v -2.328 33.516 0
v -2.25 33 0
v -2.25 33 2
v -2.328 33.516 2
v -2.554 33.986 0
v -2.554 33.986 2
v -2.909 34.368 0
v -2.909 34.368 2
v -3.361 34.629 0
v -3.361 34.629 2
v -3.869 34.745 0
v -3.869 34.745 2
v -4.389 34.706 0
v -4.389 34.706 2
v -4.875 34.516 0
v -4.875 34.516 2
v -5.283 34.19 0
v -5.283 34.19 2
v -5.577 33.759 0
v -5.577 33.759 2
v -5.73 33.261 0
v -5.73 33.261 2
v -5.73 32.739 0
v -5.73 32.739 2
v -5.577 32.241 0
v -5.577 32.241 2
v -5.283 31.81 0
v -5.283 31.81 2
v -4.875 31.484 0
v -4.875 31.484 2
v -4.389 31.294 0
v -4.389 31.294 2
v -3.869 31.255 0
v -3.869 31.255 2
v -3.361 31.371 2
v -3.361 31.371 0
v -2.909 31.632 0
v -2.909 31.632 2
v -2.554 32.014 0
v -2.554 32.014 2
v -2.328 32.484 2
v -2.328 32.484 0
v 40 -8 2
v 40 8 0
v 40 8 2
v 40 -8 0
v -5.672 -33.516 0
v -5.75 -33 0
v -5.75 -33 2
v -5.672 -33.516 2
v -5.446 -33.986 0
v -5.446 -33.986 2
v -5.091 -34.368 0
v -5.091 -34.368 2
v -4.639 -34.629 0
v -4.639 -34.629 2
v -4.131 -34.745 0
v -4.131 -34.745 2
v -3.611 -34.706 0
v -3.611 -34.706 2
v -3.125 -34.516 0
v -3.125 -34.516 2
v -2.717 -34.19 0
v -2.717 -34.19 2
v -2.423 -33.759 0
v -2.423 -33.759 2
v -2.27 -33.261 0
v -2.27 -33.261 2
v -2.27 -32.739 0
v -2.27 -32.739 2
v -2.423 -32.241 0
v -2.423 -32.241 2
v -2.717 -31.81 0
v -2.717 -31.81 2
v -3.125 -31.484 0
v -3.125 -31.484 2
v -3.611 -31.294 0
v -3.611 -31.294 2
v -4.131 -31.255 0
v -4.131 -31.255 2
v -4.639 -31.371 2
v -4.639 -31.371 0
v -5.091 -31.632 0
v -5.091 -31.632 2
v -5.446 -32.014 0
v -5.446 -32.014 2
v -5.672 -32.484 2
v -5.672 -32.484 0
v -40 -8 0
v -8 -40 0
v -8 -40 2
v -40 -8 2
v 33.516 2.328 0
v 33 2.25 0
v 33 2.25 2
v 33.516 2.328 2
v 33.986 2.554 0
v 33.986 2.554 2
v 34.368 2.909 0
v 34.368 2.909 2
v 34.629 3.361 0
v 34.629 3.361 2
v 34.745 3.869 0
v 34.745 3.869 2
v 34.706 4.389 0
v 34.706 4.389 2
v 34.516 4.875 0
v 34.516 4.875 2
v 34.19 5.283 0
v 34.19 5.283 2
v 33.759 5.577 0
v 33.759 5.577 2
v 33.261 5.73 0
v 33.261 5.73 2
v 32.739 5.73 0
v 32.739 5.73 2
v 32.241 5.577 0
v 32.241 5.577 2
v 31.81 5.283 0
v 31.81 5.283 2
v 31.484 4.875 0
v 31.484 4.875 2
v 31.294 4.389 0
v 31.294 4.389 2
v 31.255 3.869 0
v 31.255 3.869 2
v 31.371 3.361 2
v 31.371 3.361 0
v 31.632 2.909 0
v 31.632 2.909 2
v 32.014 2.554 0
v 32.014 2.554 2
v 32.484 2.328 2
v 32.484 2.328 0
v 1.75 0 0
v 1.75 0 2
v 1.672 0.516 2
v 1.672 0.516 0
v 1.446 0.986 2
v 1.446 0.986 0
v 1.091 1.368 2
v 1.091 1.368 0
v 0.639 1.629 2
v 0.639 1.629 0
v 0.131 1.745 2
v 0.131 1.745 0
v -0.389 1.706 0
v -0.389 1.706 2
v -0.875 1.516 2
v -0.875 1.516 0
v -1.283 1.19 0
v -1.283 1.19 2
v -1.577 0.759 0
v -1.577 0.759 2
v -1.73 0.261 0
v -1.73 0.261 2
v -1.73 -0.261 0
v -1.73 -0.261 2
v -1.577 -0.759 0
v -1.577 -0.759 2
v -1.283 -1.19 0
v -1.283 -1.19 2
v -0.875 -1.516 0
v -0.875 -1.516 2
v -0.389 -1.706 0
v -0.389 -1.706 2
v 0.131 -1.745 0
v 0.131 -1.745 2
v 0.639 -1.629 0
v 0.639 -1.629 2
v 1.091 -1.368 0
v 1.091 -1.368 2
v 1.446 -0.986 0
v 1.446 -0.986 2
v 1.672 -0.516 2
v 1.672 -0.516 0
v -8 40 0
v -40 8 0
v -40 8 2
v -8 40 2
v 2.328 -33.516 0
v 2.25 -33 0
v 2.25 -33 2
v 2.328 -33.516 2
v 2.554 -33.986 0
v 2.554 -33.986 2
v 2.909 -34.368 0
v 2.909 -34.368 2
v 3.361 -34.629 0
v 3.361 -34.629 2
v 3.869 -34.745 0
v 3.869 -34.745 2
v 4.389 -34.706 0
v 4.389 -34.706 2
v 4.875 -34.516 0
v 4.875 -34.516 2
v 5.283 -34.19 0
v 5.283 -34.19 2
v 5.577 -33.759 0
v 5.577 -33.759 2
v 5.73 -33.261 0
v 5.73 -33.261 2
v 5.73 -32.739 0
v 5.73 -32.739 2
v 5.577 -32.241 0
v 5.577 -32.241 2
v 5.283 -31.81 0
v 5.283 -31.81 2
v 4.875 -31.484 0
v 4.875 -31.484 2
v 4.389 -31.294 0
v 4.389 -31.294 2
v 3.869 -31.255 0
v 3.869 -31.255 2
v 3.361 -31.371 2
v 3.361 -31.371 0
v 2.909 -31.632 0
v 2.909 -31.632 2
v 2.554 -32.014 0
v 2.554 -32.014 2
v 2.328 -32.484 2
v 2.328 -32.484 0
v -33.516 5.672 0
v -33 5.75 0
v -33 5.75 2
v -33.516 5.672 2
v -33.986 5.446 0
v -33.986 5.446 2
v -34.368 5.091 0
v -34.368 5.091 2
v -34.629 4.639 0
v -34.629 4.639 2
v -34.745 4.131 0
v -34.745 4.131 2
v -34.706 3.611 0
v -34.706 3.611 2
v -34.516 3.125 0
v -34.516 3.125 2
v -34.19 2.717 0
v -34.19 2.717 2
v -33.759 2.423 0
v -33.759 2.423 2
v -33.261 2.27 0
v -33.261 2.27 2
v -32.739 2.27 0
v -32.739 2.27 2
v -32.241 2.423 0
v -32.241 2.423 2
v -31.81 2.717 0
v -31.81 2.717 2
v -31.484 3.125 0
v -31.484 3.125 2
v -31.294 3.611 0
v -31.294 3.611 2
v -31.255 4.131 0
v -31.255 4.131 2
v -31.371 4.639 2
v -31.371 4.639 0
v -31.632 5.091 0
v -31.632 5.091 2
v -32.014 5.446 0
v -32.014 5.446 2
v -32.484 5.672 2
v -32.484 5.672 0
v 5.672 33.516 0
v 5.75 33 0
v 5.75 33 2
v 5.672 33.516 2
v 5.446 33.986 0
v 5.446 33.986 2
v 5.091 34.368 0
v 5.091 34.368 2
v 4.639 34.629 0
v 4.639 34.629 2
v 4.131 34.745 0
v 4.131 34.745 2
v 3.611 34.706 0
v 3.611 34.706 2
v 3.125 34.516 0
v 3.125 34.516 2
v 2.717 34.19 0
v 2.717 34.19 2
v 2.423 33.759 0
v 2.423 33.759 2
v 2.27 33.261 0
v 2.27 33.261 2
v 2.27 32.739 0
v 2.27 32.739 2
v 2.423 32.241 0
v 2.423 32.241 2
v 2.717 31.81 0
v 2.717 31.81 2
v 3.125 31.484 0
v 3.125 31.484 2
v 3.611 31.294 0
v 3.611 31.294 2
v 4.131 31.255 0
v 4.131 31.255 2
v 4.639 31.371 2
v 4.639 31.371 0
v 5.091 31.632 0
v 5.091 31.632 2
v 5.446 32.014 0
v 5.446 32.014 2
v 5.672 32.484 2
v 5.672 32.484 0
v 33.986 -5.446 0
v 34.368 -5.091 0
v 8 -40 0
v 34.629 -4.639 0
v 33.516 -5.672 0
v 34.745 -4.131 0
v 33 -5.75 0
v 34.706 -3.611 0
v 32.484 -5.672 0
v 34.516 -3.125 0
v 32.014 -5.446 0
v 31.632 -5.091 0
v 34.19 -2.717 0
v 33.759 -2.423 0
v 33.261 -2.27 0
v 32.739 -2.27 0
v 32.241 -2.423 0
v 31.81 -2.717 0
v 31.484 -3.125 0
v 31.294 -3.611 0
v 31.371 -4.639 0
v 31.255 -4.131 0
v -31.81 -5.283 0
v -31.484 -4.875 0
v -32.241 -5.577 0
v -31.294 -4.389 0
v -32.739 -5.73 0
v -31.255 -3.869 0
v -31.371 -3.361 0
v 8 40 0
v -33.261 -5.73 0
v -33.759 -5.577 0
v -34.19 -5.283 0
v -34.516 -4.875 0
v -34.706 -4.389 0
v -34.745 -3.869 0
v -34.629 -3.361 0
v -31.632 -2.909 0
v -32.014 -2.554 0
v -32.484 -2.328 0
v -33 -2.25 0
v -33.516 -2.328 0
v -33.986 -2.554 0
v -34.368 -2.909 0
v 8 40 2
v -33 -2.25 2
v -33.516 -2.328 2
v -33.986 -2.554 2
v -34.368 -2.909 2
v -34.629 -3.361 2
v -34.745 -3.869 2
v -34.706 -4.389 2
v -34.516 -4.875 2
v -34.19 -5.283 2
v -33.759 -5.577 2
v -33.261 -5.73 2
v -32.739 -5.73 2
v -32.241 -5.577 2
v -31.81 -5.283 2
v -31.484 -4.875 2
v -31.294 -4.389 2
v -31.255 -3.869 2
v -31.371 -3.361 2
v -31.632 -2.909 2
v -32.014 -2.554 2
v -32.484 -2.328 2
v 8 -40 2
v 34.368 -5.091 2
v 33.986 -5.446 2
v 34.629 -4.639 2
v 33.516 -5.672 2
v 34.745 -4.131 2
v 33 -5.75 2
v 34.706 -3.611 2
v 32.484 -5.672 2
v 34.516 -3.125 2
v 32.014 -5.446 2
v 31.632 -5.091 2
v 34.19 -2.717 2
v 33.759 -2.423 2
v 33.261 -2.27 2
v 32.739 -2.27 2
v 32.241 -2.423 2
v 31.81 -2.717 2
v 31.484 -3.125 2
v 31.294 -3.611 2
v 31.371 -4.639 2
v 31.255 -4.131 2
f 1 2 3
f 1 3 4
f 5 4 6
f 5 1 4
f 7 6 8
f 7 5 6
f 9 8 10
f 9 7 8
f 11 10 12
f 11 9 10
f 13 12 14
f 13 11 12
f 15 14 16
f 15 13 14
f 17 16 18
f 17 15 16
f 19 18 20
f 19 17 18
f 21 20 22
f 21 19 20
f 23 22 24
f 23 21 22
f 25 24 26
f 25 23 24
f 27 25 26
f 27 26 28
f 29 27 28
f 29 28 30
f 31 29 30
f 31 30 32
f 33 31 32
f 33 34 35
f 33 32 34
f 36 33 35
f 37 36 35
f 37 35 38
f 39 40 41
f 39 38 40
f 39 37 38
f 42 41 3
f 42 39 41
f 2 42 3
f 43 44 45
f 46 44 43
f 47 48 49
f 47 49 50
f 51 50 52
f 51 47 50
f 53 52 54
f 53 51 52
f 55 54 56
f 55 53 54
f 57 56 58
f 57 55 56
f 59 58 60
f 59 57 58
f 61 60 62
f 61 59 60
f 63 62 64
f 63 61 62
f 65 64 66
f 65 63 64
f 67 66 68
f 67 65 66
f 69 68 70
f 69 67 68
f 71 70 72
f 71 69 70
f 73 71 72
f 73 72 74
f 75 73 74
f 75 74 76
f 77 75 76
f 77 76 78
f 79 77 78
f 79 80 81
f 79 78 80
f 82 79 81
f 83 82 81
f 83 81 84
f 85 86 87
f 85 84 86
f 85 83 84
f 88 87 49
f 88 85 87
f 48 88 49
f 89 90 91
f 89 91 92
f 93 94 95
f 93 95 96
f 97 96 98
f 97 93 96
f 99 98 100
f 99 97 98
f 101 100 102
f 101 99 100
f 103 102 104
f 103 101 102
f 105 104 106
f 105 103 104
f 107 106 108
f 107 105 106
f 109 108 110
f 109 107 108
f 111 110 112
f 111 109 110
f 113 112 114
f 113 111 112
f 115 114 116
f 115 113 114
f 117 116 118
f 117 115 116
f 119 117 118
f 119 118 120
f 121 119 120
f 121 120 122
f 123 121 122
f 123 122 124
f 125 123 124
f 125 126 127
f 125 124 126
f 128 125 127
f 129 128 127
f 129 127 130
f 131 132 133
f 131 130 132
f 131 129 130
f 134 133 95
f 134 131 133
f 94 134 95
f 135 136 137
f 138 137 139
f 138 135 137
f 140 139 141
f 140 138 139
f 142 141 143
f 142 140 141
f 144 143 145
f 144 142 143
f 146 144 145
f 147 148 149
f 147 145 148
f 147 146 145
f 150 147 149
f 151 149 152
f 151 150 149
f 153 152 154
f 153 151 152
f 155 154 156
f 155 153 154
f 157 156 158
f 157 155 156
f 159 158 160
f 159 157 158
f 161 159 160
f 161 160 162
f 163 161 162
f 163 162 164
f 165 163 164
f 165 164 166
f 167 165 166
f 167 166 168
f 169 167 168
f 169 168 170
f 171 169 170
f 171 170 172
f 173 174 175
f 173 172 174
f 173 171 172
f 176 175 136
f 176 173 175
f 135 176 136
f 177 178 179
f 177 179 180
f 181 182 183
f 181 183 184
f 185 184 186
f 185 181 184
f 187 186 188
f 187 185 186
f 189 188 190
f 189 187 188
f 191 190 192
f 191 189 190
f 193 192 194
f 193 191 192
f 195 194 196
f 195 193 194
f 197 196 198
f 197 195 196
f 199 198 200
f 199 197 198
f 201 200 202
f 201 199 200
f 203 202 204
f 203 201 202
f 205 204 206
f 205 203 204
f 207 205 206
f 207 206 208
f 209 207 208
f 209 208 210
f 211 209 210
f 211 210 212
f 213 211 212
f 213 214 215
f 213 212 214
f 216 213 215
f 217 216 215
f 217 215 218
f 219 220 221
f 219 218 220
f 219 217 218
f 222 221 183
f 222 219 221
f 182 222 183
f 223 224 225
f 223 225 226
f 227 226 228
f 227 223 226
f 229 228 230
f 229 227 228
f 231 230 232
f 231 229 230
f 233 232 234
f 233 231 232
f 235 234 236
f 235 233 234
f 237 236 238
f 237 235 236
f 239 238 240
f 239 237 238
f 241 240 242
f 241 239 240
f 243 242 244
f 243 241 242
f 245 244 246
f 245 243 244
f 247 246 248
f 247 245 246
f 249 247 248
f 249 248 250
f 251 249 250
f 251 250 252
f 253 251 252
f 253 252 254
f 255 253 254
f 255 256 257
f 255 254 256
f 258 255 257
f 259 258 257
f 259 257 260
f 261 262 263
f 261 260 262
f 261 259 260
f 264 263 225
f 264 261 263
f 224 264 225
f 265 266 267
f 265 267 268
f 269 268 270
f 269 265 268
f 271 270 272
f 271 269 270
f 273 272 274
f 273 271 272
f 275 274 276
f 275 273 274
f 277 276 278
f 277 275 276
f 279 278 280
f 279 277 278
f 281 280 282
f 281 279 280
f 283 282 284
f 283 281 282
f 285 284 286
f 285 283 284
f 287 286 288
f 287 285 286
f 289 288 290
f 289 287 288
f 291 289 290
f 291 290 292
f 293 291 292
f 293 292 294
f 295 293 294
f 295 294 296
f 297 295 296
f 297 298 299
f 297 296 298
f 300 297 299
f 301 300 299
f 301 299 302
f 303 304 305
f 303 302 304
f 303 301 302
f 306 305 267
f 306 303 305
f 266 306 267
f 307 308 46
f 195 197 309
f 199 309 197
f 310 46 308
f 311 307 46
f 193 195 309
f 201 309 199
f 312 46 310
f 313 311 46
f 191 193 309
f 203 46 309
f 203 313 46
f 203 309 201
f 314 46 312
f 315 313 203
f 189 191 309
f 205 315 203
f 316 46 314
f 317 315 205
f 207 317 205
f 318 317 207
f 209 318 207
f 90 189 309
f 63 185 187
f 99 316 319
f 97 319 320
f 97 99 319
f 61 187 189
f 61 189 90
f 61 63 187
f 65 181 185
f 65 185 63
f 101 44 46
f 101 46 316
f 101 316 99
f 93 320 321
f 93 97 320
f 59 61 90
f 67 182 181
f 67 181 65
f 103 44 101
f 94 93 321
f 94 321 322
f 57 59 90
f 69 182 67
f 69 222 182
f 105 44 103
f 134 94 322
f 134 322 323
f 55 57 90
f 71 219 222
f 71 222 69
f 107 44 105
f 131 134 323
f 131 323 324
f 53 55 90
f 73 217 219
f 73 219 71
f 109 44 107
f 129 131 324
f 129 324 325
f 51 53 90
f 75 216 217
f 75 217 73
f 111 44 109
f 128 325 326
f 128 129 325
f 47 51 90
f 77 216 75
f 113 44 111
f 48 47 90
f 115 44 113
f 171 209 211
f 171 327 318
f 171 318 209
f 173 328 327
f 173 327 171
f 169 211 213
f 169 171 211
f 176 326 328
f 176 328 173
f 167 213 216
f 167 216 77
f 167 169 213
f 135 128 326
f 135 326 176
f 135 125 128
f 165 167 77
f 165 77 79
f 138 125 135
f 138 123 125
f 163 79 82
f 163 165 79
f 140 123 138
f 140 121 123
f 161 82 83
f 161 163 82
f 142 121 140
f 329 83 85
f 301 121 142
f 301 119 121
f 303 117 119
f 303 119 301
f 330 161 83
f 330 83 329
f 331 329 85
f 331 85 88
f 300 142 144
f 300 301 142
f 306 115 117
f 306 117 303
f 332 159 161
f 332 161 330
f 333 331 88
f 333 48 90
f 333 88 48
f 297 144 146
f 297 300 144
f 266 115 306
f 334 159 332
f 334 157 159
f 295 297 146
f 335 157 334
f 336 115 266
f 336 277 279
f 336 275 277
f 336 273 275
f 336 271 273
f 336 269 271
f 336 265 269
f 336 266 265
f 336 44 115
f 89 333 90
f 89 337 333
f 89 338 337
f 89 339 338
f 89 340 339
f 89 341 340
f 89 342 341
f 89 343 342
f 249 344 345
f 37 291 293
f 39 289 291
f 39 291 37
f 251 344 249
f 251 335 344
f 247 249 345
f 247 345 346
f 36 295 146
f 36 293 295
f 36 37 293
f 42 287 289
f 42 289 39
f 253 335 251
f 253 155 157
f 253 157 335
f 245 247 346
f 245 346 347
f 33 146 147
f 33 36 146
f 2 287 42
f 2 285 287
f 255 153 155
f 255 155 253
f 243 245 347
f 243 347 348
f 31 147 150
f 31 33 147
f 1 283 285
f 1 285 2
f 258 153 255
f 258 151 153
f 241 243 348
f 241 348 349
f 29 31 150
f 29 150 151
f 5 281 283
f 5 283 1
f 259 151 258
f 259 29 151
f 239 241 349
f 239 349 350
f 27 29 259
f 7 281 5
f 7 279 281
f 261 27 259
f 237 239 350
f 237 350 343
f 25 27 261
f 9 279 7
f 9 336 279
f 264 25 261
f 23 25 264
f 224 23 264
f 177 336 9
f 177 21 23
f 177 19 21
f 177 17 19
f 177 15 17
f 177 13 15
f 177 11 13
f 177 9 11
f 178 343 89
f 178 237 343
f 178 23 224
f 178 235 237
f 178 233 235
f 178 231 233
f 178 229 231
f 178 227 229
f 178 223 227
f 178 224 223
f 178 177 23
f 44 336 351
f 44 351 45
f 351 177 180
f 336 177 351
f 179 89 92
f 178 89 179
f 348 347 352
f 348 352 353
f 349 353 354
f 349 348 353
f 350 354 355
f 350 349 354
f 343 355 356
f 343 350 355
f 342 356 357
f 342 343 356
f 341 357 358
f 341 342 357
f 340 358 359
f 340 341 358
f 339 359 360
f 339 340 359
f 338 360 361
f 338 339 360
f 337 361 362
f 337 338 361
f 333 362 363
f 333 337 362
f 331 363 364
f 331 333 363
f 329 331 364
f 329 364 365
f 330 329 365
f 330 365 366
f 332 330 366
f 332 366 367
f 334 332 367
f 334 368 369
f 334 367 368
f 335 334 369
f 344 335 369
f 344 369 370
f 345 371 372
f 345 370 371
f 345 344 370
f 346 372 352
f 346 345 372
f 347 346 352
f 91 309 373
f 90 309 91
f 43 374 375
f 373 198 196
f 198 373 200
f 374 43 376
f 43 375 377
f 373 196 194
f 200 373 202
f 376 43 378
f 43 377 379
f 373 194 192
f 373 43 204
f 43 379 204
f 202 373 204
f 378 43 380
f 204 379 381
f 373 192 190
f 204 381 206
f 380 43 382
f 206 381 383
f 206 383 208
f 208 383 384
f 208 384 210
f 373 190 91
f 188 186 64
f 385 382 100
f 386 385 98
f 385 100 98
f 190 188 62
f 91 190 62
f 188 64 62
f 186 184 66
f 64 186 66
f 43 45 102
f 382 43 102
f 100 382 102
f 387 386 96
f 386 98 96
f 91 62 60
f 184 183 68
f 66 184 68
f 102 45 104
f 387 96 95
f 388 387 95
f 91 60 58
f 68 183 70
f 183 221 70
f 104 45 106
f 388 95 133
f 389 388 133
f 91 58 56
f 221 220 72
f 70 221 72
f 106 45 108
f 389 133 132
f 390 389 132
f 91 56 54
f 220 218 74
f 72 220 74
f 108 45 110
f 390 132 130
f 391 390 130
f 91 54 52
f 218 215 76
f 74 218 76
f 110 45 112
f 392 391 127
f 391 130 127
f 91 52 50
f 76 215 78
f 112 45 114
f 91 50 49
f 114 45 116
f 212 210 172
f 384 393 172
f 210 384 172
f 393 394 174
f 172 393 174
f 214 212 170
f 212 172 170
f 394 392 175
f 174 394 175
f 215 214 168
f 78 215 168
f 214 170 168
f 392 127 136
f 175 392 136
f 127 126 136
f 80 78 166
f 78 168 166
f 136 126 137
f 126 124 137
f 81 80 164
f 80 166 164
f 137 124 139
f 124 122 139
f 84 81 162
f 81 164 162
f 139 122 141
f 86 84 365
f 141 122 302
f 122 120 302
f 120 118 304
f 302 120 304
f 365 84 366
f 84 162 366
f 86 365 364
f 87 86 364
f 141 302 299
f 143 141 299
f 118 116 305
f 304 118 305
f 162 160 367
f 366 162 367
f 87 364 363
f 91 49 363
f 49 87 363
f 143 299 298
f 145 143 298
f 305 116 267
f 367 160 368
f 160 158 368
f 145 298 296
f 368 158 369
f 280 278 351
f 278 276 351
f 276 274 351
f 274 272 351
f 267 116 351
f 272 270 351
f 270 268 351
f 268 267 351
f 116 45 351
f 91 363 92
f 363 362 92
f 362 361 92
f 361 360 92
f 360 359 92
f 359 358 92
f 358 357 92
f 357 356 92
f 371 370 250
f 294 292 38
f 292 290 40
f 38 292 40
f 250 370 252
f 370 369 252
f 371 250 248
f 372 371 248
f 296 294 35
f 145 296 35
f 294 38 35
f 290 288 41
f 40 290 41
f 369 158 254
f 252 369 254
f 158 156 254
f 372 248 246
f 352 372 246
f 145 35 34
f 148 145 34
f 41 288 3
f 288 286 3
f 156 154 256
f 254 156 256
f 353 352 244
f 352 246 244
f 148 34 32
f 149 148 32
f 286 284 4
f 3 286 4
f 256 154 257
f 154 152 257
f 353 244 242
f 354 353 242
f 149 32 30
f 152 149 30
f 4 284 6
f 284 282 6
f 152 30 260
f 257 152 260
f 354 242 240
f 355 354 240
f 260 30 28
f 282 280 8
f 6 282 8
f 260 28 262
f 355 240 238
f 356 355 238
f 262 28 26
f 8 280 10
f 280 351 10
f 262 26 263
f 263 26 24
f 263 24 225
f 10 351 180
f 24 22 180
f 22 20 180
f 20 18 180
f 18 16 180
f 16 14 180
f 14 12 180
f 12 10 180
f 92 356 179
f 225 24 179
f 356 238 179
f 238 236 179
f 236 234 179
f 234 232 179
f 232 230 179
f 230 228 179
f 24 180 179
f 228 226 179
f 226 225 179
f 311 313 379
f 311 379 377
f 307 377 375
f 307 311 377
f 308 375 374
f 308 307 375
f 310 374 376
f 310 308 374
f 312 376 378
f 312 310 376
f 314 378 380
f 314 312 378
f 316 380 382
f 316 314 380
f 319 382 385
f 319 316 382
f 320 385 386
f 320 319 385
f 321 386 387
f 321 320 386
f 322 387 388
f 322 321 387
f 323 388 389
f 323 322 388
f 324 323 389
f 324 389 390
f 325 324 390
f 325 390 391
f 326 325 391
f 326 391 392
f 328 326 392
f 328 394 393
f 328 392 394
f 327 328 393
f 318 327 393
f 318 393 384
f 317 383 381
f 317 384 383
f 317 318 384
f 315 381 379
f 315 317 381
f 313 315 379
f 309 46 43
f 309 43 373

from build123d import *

# Parameters (mm, degrees)
BOSS_EXTRUDE1_DEPTH = 2
CUT_EXTRUDE1_START  = -3
SKETCH2_R           = 1.75
CUT_EXTRUDE1_DEPTH  = 4
CIRPATTERN1_COUNT   = 4


with BuildPart() as part:
    # Sketch1 → Boss-Extrude1 (new body)
    with BuildSketch(Plane.XY):
        Polygon((-8, 40), (8, 40), (40, 8), (40, -8), (8, -40), (-8, -40), (-40, -8), (-40, 8), align=None)
    extrude(amount=BOSS_EXTRUDE1_DEPTH)

    # Sketch2 → Cut-Extrude1 (cut)
    with BuildSketch(Plane.XY.offset(2).offset(CUT_EXTRUDE1_START)):
        with Locations((-4, 33)):
            Circle(SKETCH2_R)
        with Locations((4, 33)):
            Circle(SKETCH2_R)
        Circle(SKETCH2_R)
    cut_extrude1 = extrude(amount=CUT_EXTRUDE1_DEPTH, mode=Mode.SUBTRACT)

    # CirPattern1: Cut-Extrude1 ×4 about axis
    cirpattern1_axis = Axis((0, 0, 0), (0, 0, 1))
    for i in range(1, CIRPATTERN1_COUNT):
        add(cut_extrude1.rotate(cirpattern1_axis, i * 360 / CIRPATTERN1_COUNT), mode=Mode.SUBTRACT)


solid = part.part
